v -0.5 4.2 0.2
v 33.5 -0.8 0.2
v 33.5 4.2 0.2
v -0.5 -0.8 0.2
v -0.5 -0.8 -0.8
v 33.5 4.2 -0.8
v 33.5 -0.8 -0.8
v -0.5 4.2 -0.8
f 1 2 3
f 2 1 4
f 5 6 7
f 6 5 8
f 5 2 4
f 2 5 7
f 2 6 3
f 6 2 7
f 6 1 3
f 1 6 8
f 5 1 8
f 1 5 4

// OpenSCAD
type_your_name = "";
plate_size = 34;  // [10:100]
x = (16.5/34) * plate_size;


translate([x,1.7,-.3])
cube([plate_size,5,1],center=true);




//Draw text
#scale([.5,.5,.5]) drawtext(type_your_name);

//Draw character set
//scale([2,2,2]) drawtext(" !\"#$%&'()*+,-./0123456789:;<=>?@ABCDEFGHIJKLMNOPQRSTUVWXYZ[\\]^_`abcdefghijklmnopqrstuvwxyz{|}");

module drawtext(text) {
	//Characters
	chars = " !\"#$%&'()*+,-./0123456789:;<=>?@ABCDEFGHIJKLMNOPQRSTUVWXYZ[\\]^_`abcdefghijklmnopqrstuvwxyz{|}";

	//Chracter table defining 5x7 characters
	//Adapted from: http://www.geocities.com/dinceraydin/djlcdsim/chartable.js
	char_table = [ [ 0, 0, 0, 0, 0, 0, 0],
                  [ 4, 0, 4, 4, 4, 4, 4],
                  [ 0, 0, 0, 0,10,10,10],
                  [10,10,31,10,31,10,10],
                  [ 4,30, 5,14,20,15, 4],
                  [ 3,19, 8, 4, 2,25,24],
                  [13,18,21, 8,20,18,12],
                  [ 0, 0, 0, 0, 8, 4,12],
                  [ 2, 4, 8, 8, 8, 4, 2],
                  [ 8, 4, 2, 2, 2, 4, 8],
                  [ 0, 4,21,14,21, 4, 0],
                  [ 0, 4, 4,31, 4, 4, 0],
                  [ 8, 4,12, 0, 0, 0, 0],
                  [ 0, 0, 0,31, 0, 0, 0],
                  [12,12, 0, 0, 0, 0, 0],
                  [ 0,16, 8, 4, 2, 1, 0],
                  [14,17,25,21,19,17,14],
                  [14, 4, 4, 4, 4,12, 4],
                  [31, 8, 4, 2, 1,17,14],
                  [14,17, 1, 2, 4, 2,31],
                  [ 2, 2,31,18,10, 6, 2],
                  [14,17, 1, 1,30,16,31],
                  [14,17,17,30,16, 8, 6],
                  [ 8, 8, 8, 4, 2, 1,31],
                  [14,17,17,14,17,17,14],
                  [12, 2, 1,15,17,17,14],
                  [ 0,12,12, 0,12,12, 0],
                  [ 8, 4,12, 0,12,12, 0],
                  [ 2, 4, 8,16, 8, 4, 2],
                  [ 0, 0,31, 0,31, 0, 0],
                  [16, 8, 4, 2, 4, 8,16],
                  [ 4, 0, 4, 2, 1,17,14],
                  [14,21,21,13, 1,17,14],
                  [17,17,31,17,17,17,14],
                  [30,17,17,30,17,17,30],
                  [14,17,16,16,16,17,14],
                  [30,17,17,17,17,17,30],
                  [31,16,16,30,16,16,31],
                  [16,16,16,30,16,16,31],
                  [15,17,17,23,16,17,14],
                  [17,17,17,31,17,17,17],
                  [14, 4, 4, 4, 4, 4,14],
                  [12,18, 2, 2, 2, 2, 7],
                  [17,18,20,24,20,18,17],
                  [31,16,16,16,16,16,16],
                  [17,17,17,21,21,27,17],
                  [17,17,19,21,25,17,17],
                  [14,17,17,17,17,17,14],
                  [16,16,16,30,17,17,30],
                  [13,18,21,17,17,17,14],
                  [17,18,20,30,17,17,30],
                  [30, 1, 1,14,16,16,15],
                  [ 4, 4, 4, 4, 4, 4,31],
                  [14,17,17,17,17,17,17],
                  [ 4,10,17,17,17,17,17],
                  [10,21,21,21,17,17,17],
                  [17,17,10, 4,10,17,17],
                  [ 4, 4, 4,10,17,17,17],
                  [31,16, 8, 4, 2, 1,31],
                  [14, 8, 8, 8, 8, 8,14],
                  [ 0, 1, 2, 4, 8,16, 0],
                  [14, 2, 2, 2, 2, 2,14],
                  [ 0, 0, 0, 0,17,10, 4],
                  [31, 0, 0, 0, 0, 0, 0],
                  [ 0, 0, 0, 0, 2, 4, 8],
                  [15,17,15, 1,14, 0, 0],
                  [30,17,17,25,22,16,16],
                  [14,17,16,16,14, 0, 0],
                  [15,17,17,19,13, 1, 1],
                  [14,16,31,17,14, 0, 0],
                  [ 8, 8, 8,28, 8, 9, 6],
                  [14, 1,15,17,15, 0, 0],
                  [17,17,17,25,22,16,16],
                  [14, 4, 4, 4,12, 0, 4],
                  [12,18, 2, 2, 2, 6, 2],
                  [18,20,24,20,18,16,16],
                  [14, 4, 4, 4, 4, 4,12],
                  [17,17,21,21,26, 0, 0],
                  [17,17,17,25,22, 0, 0],
                  [14,17,17,17,14, 0, 0],
                  [16,16,30,17,30, 0, 0],
                  [ 1, 1,15,19,13, 0, 0],
                  [16,16,16,25,22, 0, 0],
                  [30, 1,14,16,15, 0, 0],
                  [ 6, 9, 8, 8,28, 8, 8],
                  [13,19,17,17,17, 0, 0],
                  [ 4,10,17,17,17, 0, 0],
                  [10,21,21,17,17, 0, 0],
                  [17,10, 4,10,17, 0, 0],
                  [14, 1,15,17,17, 0, 0],
                  [31, 8, 4, 2,31, 0, 0],
                  [ 2, 4, 4, 8, 4, 4, 2],
                  [ 4, 4, 4, 4, 4, 4, 4],
                  [ 8, 4, 4, 2, 4, 4, 8] ];

	//Binary decode table
	dec_table = [ "00000", "00001", "00010", "00011", "00100", "00101",
  	            "00110", "00111", "01000", "01001", "01010", "01011",
  	            "01100", "01101", "01110", "01111", "10000", "10001",
  	            "10010", "10011", "10100", "10101", "10110", "10111",
	            "11000", "11001", "11010", "11011", "11100", "11101",
	            "11110", "11111" ];

	//Process string one character at a time
	for(itext = [0:len(text)-1]) {
		//Convert character to index
		assign(ichar = search(text[itext],chars,1)[0]) {
			//Decode character - rows
			for(irow = [0:6]) {
				assign(val = dec_table[char_table[ichar][irow]]) {
					//Decode character - cols
					for(icol = [0:4]) {
						assign(bit = search(val[icol],"01",1)[0]) {
							if(bit) {
								//Output cube
								translate([icol + (6*itext), irow, 0])
									cube([1.0001,1.0001,1]);
							}
						}
					}
				}
			}
		}
	}
}
